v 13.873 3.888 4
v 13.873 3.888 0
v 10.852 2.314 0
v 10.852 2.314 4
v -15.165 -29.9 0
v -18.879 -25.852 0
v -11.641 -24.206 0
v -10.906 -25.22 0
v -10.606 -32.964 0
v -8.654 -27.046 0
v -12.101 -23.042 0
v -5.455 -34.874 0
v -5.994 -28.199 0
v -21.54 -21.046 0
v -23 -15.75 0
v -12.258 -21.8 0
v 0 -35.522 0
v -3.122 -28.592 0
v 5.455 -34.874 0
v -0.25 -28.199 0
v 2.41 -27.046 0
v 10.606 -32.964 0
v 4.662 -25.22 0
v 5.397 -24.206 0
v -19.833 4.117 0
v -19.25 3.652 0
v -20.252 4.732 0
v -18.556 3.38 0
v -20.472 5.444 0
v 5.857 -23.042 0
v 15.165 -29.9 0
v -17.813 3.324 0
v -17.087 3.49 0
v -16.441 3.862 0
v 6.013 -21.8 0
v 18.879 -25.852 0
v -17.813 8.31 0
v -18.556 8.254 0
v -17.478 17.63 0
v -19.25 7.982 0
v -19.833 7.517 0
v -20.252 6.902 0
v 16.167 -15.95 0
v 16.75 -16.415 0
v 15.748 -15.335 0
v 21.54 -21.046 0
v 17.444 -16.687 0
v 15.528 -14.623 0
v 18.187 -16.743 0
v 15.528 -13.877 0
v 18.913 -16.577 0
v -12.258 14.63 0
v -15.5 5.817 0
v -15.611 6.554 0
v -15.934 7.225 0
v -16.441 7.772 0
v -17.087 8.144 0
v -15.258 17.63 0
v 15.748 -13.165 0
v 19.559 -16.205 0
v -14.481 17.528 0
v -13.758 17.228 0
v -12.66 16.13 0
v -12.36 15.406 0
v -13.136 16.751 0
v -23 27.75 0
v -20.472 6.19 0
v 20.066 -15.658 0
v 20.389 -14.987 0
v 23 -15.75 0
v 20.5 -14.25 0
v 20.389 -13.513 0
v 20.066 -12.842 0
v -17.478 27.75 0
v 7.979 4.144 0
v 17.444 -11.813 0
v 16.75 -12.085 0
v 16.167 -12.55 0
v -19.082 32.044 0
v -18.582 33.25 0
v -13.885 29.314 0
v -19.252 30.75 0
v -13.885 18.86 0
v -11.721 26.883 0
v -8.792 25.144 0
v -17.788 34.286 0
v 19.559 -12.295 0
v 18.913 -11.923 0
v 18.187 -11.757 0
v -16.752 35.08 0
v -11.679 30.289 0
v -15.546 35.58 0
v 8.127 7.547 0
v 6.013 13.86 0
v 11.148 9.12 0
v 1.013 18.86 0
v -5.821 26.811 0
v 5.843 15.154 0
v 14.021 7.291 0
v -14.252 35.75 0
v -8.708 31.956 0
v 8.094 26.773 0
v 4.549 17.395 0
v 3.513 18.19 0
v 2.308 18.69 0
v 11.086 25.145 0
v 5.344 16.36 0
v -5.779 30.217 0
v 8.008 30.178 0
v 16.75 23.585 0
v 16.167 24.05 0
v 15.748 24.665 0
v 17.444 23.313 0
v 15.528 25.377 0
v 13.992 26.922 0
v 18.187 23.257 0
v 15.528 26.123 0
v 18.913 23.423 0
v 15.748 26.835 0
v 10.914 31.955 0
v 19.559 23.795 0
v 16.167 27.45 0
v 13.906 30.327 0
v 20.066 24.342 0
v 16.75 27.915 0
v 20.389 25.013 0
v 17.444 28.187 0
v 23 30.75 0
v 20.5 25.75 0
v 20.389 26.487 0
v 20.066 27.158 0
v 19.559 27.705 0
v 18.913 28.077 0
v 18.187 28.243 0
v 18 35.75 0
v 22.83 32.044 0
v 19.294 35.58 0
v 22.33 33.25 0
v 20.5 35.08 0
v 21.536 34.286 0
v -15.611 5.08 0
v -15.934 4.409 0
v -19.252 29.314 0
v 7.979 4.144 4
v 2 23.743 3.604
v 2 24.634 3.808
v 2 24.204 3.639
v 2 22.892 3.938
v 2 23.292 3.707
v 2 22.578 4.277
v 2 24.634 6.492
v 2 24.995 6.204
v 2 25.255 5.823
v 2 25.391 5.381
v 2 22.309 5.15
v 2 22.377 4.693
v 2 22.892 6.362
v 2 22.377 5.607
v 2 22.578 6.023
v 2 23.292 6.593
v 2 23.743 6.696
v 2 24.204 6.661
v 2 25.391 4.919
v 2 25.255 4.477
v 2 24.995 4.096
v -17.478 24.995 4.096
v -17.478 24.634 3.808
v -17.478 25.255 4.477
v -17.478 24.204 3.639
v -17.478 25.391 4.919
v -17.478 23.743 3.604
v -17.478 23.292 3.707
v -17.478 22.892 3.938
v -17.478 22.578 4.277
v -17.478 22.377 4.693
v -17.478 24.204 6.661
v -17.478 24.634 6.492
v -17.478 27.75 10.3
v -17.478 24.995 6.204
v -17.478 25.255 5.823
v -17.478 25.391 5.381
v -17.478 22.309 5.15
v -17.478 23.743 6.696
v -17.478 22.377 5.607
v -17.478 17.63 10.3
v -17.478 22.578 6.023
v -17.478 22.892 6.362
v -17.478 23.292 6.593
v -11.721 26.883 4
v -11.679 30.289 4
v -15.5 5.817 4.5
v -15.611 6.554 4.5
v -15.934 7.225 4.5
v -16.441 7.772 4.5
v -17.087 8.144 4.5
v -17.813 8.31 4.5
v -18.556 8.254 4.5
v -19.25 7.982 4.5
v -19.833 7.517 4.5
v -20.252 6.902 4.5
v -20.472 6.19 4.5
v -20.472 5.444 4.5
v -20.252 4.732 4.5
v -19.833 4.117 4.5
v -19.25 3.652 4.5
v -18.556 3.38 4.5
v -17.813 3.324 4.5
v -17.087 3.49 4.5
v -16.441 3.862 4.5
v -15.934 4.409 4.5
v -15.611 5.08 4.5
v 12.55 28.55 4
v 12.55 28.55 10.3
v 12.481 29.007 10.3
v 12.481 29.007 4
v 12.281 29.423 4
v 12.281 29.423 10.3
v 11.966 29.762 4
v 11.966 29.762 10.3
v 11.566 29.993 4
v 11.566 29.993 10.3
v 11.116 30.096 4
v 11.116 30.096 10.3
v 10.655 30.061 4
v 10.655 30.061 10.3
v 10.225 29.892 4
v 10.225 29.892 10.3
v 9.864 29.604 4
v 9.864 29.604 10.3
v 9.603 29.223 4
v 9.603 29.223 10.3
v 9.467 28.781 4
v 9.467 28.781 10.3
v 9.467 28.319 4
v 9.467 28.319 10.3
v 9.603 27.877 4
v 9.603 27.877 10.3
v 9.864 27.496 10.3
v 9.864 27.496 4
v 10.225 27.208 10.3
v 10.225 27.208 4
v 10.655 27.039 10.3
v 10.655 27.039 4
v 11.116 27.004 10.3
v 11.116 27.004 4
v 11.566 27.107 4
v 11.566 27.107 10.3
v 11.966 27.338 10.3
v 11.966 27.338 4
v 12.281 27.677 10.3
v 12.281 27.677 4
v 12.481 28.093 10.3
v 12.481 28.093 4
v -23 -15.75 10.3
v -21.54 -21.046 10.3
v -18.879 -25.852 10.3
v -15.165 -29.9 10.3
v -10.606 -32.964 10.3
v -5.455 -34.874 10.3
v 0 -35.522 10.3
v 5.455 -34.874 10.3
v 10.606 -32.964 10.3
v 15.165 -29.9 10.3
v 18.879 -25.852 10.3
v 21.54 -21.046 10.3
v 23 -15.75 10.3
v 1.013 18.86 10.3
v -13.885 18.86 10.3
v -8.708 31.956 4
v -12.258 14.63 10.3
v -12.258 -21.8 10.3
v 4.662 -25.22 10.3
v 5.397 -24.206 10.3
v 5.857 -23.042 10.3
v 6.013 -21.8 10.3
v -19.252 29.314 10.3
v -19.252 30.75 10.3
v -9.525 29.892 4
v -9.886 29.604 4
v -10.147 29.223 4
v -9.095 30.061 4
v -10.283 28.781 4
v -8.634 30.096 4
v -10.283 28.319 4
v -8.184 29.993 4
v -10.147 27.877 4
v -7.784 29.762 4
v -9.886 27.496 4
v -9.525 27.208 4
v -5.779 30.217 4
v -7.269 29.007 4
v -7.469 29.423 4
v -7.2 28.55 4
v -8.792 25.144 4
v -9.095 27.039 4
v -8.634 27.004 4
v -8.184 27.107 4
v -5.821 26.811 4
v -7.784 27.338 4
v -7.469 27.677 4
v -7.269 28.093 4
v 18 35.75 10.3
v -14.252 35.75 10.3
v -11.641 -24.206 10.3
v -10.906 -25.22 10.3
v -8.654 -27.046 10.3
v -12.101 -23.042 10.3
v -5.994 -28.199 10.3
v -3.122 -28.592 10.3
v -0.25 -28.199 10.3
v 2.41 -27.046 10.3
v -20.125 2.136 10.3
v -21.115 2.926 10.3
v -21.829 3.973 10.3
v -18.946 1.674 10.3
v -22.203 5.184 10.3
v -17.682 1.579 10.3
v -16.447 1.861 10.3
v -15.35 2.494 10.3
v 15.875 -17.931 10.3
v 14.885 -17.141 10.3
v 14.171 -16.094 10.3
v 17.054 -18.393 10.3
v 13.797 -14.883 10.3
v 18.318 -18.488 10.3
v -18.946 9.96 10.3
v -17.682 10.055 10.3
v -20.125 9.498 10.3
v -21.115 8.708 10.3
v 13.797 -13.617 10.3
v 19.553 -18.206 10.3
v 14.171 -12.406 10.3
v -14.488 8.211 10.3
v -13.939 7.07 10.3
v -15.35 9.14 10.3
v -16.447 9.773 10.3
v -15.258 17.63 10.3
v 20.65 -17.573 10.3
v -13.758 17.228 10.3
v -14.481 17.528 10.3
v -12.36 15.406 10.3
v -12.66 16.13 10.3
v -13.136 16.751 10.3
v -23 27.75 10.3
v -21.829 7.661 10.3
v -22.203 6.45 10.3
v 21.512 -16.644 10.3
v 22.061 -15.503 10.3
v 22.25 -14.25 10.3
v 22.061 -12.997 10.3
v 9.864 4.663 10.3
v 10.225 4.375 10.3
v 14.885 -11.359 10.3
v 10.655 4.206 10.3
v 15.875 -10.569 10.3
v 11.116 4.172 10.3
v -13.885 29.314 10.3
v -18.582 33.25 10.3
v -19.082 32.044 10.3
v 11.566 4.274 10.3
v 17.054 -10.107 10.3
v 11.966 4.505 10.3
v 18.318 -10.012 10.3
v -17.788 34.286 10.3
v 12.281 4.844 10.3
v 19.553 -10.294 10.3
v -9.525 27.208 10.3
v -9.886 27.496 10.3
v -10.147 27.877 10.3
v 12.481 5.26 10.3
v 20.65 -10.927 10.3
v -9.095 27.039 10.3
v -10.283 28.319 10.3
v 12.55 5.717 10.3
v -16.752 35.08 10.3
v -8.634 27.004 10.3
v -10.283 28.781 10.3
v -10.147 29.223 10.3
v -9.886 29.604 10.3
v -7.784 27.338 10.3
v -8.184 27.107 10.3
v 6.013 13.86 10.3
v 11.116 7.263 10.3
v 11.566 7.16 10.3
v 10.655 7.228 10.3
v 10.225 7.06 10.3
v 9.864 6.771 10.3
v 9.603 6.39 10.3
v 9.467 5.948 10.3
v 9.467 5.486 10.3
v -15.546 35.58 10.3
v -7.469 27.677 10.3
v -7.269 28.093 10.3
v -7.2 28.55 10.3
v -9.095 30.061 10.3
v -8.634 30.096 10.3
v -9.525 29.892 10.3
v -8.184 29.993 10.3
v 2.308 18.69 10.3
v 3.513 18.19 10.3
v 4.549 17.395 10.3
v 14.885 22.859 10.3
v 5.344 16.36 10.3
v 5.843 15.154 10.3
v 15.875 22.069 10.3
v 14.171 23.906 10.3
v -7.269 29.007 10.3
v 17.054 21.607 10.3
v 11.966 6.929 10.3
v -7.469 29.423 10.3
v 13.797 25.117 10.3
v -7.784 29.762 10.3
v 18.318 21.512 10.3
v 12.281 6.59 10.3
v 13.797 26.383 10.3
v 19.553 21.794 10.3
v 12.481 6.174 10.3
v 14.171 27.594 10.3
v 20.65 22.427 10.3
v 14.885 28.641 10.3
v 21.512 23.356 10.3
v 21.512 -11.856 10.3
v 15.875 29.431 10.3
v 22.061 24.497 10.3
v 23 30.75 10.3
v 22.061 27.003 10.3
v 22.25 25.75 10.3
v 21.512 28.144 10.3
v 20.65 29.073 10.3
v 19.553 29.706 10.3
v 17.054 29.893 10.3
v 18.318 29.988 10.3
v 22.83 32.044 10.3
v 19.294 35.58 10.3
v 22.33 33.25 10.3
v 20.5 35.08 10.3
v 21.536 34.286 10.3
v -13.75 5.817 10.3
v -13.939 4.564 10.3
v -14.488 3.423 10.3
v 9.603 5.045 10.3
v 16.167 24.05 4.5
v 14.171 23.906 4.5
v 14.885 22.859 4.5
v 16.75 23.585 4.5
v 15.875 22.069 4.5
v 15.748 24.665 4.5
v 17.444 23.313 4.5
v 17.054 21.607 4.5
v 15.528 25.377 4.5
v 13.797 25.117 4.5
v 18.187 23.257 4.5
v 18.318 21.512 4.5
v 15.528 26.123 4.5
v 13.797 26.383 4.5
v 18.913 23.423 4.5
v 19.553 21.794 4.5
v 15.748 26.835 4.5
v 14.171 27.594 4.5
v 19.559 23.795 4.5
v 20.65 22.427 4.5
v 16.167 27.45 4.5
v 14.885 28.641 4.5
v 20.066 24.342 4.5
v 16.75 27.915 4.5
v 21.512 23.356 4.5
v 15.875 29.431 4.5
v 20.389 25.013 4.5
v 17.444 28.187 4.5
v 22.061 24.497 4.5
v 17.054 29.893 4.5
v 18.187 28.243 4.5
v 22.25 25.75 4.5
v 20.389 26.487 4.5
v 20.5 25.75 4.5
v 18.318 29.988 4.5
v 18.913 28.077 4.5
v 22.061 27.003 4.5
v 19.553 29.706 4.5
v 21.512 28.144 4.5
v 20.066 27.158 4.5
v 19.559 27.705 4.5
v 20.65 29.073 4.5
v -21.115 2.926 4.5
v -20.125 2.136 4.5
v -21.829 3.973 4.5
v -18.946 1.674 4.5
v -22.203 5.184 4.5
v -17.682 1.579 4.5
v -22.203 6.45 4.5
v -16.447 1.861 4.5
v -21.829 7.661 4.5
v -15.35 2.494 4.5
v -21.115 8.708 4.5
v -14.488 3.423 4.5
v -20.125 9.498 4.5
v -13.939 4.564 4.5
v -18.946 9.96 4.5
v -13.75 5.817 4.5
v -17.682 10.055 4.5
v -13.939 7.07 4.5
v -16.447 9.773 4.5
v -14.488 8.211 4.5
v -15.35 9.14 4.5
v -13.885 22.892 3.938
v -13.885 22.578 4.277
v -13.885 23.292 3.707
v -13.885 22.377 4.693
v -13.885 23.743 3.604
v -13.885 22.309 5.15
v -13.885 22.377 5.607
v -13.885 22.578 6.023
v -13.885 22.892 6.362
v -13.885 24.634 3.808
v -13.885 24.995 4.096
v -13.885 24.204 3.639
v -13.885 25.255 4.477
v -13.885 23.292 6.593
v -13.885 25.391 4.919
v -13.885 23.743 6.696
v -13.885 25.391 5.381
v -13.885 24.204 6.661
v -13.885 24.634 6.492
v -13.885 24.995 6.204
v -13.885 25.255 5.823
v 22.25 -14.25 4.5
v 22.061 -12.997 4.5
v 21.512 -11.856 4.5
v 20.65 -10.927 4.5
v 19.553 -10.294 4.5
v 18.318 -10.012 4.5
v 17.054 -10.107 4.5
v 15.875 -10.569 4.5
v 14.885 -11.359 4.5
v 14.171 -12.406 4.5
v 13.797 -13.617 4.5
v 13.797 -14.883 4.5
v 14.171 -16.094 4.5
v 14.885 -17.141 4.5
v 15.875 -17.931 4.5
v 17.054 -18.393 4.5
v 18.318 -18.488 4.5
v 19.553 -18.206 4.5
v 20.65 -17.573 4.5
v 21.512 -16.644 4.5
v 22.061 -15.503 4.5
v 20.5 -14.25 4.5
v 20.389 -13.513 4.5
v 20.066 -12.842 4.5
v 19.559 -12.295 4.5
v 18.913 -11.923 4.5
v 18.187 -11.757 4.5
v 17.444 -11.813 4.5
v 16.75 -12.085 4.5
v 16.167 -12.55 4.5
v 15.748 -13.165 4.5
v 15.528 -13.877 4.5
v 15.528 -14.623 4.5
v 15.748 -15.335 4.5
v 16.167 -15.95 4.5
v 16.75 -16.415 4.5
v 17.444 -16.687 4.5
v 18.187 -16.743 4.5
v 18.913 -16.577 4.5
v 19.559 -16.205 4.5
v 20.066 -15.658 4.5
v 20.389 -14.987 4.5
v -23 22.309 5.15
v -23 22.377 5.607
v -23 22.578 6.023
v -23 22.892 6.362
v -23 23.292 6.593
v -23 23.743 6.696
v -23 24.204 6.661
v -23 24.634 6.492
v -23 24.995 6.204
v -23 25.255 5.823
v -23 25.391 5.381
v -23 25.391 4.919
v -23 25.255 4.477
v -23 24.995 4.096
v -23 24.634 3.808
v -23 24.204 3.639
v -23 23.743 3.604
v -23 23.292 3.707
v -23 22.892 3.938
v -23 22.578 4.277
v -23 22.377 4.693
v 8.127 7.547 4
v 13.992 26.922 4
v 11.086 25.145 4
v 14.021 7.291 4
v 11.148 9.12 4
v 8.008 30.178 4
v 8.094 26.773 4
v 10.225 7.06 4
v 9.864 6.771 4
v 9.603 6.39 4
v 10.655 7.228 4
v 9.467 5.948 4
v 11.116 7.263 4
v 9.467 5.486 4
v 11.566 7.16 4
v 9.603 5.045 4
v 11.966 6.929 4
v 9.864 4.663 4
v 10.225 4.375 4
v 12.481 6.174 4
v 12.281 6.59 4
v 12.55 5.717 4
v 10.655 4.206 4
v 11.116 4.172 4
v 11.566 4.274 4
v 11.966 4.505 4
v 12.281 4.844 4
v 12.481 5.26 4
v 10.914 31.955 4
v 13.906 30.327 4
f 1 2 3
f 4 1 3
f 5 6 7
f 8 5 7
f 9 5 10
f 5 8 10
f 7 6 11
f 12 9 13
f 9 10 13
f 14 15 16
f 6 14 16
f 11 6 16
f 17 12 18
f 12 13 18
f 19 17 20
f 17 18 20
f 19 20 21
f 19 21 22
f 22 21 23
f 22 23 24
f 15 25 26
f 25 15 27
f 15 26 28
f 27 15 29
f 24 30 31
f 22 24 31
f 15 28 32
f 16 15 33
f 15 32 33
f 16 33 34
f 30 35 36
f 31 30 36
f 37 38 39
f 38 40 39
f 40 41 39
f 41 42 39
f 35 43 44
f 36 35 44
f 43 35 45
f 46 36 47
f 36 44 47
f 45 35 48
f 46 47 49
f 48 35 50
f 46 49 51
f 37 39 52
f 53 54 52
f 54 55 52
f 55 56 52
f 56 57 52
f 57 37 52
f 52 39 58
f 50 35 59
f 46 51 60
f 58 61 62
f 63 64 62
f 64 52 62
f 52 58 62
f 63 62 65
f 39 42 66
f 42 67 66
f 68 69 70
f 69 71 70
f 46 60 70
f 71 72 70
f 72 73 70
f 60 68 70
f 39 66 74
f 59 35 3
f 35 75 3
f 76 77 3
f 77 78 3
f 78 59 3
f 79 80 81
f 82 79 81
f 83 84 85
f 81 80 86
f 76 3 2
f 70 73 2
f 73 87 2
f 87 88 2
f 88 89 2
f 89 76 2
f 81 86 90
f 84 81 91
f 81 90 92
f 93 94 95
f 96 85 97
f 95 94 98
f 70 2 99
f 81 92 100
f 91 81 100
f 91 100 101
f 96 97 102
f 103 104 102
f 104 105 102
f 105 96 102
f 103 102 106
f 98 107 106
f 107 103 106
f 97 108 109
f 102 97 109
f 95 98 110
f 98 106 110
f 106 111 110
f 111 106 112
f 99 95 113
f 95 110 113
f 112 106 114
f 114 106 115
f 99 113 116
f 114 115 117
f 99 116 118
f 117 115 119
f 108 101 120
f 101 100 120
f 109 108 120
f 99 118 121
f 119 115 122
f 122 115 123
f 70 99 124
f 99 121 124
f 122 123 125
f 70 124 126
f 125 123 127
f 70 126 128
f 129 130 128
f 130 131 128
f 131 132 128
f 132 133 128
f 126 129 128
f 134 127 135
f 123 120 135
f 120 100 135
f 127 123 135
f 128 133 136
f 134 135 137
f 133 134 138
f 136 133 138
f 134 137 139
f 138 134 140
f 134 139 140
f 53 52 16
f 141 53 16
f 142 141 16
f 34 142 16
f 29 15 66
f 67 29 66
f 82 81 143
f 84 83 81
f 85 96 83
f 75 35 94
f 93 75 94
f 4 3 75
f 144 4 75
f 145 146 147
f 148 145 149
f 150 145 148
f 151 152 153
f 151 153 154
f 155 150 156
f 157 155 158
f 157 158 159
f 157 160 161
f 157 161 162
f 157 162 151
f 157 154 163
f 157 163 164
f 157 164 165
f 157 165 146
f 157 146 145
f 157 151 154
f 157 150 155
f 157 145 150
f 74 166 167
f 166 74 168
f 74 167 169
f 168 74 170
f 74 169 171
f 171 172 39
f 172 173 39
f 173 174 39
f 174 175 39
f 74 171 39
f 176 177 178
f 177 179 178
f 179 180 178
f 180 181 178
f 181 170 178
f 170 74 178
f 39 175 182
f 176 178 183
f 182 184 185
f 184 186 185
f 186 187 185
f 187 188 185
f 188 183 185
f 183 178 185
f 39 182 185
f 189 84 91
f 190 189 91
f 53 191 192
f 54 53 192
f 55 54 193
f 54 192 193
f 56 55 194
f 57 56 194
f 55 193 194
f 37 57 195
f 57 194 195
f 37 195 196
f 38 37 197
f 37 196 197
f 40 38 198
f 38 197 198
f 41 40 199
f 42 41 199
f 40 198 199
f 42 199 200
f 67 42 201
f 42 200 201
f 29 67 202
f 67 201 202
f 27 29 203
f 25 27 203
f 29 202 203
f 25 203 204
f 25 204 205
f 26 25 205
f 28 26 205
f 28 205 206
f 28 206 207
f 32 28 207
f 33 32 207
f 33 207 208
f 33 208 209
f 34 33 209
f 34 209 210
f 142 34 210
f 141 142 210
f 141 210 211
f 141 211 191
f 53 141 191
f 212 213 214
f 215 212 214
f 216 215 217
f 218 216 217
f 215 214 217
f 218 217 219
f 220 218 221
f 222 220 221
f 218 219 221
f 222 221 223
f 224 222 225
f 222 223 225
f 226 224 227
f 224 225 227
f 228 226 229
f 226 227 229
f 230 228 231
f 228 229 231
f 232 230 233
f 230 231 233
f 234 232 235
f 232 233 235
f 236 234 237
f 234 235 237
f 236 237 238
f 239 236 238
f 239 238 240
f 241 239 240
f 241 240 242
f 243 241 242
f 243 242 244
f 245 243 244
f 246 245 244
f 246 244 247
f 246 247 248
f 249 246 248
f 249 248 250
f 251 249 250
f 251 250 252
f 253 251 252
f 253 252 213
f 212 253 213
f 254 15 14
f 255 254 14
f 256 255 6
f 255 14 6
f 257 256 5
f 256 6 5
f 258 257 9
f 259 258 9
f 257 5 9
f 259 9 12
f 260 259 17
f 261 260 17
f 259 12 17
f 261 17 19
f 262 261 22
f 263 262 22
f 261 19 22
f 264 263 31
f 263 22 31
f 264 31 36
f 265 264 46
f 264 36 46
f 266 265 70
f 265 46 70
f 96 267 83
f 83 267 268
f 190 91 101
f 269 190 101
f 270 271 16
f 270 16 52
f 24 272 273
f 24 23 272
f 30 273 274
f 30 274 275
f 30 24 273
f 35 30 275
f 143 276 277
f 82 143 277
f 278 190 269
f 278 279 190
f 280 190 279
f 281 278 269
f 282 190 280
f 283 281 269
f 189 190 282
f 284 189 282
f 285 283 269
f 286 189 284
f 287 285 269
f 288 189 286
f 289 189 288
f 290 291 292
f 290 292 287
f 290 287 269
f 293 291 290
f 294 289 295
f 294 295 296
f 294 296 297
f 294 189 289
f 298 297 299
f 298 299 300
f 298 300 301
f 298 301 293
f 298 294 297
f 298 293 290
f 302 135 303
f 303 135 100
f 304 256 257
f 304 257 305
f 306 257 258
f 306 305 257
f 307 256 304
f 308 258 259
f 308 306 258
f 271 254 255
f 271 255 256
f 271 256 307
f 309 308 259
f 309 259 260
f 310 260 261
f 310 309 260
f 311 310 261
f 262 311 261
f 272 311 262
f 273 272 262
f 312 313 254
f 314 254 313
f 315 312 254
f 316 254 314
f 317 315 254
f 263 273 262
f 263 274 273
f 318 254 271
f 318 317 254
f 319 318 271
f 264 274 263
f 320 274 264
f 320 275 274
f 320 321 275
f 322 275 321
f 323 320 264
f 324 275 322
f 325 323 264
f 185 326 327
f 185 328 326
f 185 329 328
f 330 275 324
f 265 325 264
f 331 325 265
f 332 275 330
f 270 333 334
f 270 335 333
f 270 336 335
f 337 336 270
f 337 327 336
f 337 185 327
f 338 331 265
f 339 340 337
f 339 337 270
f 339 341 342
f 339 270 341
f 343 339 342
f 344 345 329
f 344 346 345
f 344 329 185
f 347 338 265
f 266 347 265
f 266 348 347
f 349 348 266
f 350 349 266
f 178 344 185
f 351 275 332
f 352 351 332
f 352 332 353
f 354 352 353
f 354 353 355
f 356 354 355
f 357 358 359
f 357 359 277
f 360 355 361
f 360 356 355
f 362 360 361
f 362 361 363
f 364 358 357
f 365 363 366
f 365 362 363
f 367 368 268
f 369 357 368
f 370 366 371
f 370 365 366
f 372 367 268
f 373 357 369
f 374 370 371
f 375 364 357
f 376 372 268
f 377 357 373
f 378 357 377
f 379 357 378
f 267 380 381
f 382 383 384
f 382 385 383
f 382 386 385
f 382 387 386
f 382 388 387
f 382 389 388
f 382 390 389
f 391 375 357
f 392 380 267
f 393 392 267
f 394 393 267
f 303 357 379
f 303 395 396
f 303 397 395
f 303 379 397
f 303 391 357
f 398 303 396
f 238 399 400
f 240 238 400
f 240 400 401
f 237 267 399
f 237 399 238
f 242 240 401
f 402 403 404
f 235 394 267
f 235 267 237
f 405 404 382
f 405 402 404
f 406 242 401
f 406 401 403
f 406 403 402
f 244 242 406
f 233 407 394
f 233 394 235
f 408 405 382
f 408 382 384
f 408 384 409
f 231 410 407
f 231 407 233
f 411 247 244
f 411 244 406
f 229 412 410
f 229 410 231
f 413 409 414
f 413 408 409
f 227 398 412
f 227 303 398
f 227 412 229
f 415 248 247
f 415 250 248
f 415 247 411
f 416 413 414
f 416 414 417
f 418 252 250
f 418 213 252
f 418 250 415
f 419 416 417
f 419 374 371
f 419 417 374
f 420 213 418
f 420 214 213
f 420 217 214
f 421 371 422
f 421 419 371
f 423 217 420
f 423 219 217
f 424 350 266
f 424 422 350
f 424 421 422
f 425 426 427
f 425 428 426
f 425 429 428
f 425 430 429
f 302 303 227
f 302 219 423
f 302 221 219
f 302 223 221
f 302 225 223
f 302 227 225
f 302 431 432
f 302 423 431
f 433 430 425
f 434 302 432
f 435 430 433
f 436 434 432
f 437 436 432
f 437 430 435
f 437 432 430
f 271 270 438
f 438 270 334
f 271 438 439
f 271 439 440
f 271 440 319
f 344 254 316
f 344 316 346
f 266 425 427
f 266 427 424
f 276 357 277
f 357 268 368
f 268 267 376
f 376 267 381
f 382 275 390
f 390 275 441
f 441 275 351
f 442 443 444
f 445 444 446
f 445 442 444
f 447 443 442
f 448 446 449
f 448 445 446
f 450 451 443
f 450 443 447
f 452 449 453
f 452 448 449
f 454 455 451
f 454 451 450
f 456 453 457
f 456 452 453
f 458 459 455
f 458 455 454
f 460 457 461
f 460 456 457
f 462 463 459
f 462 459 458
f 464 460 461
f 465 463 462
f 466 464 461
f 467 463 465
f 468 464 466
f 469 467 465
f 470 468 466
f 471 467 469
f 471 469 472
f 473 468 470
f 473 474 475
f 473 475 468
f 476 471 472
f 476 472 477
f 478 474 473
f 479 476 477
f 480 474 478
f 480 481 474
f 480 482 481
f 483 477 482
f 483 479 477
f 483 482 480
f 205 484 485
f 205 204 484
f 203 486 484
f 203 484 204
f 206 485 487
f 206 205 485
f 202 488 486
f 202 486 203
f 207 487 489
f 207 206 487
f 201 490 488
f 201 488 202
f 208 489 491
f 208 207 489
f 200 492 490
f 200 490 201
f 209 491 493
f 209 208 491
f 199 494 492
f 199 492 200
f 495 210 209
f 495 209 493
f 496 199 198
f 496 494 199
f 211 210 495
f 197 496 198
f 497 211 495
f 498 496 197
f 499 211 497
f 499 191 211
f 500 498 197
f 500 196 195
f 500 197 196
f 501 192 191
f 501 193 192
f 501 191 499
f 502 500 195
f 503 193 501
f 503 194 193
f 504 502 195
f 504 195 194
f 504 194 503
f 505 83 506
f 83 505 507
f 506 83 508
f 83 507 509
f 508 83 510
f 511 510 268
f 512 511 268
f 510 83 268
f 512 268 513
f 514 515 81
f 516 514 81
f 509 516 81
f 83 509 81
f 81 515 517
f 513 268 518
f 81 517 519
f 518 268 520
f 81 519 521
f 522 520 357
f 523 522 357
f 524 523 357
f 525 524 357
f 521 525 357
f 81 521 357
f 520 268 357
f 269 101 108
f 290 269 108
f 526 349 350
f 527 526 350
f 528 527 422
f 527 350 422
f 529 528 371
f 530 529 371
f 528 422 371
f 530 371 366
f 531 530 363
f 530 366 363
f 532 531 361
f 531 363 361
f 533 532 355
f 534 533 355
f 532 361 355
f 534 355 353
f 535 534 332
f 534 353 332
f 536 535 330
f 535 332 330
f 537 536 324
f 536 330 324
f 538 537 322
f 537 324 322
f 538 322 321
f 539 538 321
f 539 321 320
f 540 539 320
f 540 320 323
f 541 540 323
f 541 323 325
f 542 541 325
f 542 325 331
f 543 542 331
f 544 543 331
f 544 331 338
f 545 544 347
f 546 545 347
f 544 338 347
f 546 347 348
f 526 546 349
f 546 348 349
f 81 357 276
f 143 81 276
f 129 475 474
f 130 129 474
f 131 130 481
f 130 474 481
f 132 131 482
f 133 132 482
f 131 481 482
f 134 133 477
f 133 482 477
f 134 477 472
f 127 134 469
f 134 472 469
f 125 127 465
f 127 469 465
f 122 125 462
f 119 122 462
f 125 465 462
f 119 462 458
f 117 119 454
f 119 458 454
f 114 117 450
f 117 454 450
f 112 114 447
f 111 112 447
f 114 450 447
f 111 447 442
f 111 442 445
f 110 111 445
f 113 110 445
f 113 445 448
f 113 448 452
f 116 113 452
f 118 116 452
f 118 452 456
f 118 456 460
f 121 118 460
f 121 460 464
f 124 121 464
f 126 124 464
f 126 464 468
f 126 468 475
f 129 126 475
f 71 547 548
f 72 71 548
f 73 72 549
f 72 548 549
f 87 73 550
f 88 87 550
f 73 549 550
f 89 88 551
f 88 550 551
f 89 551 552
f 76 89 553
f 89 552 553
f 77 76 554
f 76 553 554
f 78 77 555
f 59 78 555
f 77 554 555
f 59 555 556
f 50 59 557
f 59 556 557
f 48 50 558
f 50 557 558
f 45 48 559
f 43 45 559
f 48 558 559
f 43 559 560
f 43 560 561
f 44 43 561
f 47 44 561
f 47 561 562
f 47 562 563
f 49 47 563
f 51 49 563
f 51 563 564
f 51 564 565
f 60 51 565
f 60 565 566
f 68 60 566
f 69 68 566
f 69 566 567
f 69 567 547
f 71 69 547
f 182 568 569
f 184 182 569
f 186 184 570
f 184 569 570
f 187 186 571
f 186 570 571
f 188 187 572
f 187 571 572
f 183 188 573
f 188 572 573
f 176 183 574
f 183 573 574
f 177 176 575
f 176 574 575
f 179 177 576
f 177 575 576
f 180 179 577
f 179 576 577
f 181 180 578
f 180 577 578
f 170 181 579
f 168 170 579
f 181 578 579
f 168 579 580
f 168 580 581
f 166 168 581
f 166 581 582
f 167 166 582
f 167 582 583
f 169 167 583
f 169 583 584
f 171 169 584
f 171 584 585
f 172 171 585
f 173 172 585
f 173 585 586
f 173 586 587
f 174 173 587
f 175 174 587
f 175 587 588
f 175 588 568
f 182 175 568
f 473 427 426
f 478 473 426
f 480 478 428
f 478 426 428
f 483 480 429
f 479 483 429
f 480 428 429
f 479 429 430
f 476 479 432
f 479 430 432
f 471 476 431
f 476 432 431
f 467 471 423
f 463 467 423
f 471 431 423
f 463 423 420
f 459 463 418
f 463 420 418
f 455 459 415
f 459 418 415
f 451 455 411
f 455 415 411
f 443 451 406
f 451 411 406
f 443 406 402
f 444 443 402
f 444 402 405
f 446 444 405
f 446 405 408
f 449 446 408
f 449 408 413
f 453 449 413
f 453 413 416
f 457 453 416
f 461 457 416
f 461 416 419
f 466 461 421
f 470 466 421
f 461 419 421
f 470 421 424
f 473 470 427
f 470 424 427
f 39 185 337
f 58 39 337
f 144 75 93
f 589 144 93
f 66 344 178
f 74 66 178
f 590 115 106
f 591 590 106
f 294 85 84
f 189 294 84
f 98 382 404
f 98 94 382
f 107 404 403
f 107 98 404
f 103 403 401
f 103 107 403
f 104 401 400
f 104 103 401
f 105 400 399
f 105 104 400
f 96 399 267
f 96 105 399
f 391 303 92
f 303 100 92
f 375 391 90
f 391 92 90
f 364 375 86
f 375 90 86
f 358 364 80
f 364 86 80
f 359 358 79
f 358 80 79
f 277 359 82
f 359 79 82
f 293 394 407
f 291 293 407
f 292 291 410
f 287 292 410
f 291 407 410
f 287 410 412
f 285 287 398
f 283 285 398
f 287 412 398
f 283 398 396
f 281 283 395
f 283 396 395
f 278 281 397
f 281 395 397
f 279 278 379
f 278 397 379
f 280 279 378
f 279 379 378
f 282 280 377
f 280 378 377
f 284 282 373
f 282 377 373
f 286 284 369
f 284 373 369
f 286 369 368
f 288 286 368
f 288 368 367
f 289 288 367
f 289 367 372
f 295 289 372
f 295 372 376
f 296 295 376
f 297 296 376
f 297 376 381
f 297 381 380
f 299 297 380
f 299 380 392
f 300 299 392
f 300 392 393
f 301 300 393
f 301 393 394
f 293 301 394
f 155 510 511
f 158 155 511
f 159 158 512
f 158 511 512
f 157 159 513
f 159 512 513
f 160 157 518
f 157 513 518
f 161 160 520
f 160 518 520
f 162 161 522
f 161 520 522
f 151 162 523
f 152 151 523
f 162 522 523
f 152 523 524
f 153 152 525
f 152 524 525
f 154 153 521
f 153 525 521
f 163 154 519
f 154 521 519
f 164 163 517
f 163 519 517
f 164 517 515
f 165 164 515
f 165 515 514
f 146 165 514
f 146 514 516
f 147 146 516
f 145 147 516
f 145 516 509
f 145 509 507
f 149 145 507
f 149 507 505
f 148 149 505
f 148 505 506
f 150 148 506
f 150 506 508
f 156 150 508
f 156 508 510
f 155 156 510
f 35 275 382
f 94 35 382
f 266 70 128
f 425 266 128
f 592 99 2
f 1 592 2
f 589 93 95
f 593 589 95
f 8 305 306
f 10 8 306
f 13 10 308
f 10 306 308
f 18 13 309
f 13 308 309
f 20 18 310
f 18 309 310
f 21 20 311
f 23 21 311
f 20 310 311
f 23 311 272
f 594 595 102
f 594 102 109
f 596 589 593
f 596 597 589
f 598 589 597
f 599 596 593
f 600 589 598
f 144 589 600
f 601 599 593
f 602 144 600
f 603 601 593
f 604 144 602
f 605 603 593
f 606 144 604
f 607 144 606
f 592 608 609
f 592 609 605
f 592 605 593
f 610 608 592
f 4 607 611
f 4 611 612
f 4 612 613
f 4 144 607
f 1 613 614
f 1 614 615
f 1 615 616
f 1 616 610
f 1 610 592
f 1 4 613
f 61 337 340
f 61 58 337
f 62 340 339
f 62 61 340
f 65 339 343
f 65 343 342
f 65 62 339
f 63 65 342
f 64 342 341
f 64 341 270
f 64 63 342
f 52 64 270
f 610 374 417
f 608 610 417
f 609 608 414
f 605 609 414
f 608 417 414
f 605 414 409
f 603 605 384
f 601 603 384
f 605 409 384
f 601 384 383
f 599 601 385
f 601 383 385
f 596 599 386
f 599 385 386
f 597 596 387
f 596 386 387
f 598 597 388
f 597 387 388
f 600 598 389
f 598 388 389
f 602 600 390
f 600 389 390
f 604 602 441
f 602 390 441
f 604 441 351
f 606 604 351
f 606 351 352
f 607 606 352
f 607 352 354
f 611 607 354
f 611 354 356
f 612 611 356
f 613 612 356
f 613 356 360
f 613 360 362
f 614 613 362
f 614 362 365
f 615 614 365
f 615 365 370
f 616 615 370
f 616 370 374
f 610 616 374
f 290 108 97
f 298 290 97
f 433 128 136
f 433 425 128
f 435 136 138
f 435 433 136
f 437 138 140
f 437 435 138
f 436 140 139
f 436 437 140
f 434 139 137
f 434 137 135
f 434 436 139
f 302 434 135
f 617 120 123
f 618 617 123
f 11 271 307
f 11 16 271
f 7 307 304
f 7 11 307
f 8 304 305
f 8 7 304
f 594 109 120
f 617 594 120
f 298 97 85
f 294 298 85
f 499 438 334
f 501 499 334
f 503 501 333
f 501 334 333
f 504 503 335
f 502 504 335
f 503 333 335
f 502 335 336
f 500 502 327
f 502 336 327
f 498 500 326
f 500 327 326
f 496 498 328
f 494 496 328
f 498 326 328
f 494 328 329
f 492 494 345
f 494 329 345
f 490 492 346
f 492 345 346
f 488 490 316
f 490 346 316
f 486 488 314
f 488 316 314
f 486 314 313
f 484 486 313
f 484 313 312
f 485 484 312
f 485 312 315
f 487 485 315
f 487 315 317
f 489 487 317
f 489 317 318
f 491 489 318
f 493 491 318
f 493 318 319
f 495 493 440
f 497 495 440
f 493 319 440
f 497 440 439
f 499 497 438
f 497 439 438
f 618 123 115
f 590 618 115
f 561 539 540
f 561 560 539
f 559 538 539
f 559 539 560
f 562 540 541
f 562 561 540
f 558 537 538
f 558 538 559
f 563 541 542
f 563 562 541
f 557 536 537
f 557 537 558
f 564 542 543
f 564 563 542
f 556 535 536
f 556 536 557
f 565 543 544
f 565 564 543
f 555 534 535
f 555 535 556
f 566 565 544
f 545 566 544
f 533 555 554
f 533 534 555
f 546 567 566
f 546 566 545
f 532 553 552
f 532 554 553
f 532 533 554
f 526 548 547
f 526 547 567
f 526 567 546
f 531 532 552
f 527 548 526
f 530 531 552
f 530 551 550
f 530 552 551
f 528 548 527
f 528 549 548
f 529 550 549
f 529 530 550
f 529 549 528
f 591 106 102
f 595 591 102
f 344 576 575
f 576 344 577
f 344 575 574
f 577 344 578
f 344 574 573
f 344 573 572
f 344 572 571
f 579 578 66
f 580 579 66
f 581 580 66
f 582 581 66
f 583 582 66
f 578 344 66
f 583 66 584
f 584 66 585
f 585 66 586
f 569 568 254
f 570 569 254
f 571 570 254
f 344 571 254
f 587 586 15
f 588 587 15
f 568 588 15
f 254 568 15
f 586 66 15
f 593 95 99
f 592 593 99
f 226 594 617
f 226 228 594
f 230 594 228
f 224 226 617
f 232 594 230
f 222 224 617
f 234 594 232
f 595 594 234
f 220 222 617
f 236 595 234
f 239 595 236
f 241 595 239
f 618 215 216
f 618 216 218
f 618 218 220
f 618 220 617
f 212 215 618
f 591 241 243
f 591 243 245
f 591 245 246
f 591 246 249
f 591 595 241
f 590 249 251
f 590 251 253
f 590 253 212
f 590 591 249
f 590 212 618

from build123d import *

# Parameters (mm, degrees)
F1_DEPTH  = 10.3
F2_R      = 1.55
F2_R_2    = 2.5
F2_W      = 18.2711938396
F2_H      = 41.0630945116
F2_W_2    = 3.7480126619
F2_H_2    = 6.4359663129
F3_DEPTH  = 10.3
F4_R      = 3
F5_R      = 5
F6_R      = 4.25
F7_DEPTH  = 5.8
F8_R      = 1.55
F9_DEPTH  = 25
F11_DEPTH = 4


with BuildPart() as f1:
    # F0 (on Top) → F1 (new body)
    with BuildSketch(Plane.XY):
        with BuildLine():
            Line((23, -15.75), (23, 35.75))
            Line((23, 35.75), (-23, 35.75))
            Line((-23, 35.75), (-23, -15.75))
            ThreePointArc((-23, -15.75), (0, -35.5223387435), (23, -15.75))
        make_face()
    extrude(amount=F1_DEPTH)

    # F2 (on face) → F3 (cut, through all)
    with BuildSketch(Plane.XY.offset(10.3)):
        with Locations((11, 28.55)):
            Circle(F2_R)
        with Locations((-8.75, 28.55)):
            Circle(F2_R)
        with Locations((11, 5.7171783878)):
            Circle(F2_R)
        with Locations((18, 25.75)):
            Circle(F2_R_2)
        with Locations((18, -14.25)):
            Circle(F2_R_2)
        with Locations((-18, 5.8170498922)):
            Circle(F2_R_2)
        with Locations((-3.1221020035, -2.9017189518)):
            Rectangle(F2_W, F2_H)
        Polygon((-12.2576989233, 17.6298283041), (6.0134949163, 17.6298283041), (6.0134949163, 18.8598968089), (-12.2576989233, 18.8598968089), (-13.8854337856, 18.8598968089), (-13.8854337856, 29.3140336871), (-15.5863631517, 29.3140336871), (-19.2519873381, 29.3140336871), (-23, 29.3140336871), (-23, 27.7502387762), (-17.4777284265, 27.7502387762), (-17.4777284265, 17.6298283041), (-15.5863631517, 17.6298283041), align=None)
        with BuildLine():
            ThreePointArc((-12.2576989233, -23.4332662076), (-3.1221020035, -28.5924931443), (6.0134949163, -23.4332662076))
            Line((6.0134949163, -23.4332662076), (-12.2576989233, -23.4332662076))
        make_face()
        with Locations((-21.125993669, 32.5320168436)):
            Rectangle(F2_W_2, F2_H_2)
    extrude(amount=-F3_DEPTH, mode=Mode.SUBTRACT)

    # F4
    f4_edges = [f1.edges().sort_by_distance(p)[0] for p in [
        (-12.257699, 17.629828, 5.15),
    ]]
    fillet(f4_edges, radius=F4_R)

    # F5
    f5_edges = [f1.edges().sort_by_distance(p)[0] for p in [
        (-19.251987, 35.75, 5.15),
        (23, 35.75, 5.15),
        (-12.257699, -23.433266, 5.15),
        (6.013495, -23.433266, 5.15),
        (6.013495, 18.859897, 5.15),
    ]]
    fillet(f5_edges, radius=F5_R)

    # F6 (on face) → F7 (cut)
    with BuildSketch(Plane.XY.offset(10.3)):
        with Locations((18, 25.75)):
            Circle(F6_R)
        with Locations((-18, 5.8170498922)):
            Circle(F6_R)
        with Locations((18, -14.25)):
            Circle(F6_R)
    extrude(amount=-F7_DEPTH, mode=Mode.SUBTRACT)

    # F8 (on face) → F9 (cut)
    with BuildSketch(Plane(origin=(-23, 0, 0), x_dir=(0, -1, 0), z_dir=(-1, 0, 0))):
        with Locations((-23.8586217165, 5.15)):
            Circle(F8_R)
    extrude(amount=-F9_DEPTH, mode=Mode.SUBTRACT)

    # F10 (on face) → F11 (cut)
    with BuildSketch(Plane(origin=(0, 0, 0), x_dir=(1, 0, 0), z_dir=(0, 0, -1))):
        Polygon((11.0856638946, -25.1447107273), (8.09376493, -26.7731682547), (8.0081010353, -30.1784575274), (10.9143361054, -31.9552892727), (13.90623507, -30.3268317453), (13.9918989647, -26.9215424726), align=None)
        Polygon((-8.7919851376, -25.1438921653), (-11.7207684817, -26.8833062784), (-11.6787833441, -30.2894141131), (-8.7080148624, -31.9561078347), (-5.7792315183, -30.2166937216), (-5.8212166559, -26.8105858869), align=None)
        Polygon((10.8521251413, -2.3140230343), (7.9788435816, -4.1436640952), (8.1267184402, -7.5468194487), (11.1478748587, -9.1203337412), (14.0211564184, -7.2906926803), (13.8732815598, -3.8875373269), align=None)
    extrude(amount=-F11_DEPTH, mode=Mode.SUBTRACT)


solid = f1.part
